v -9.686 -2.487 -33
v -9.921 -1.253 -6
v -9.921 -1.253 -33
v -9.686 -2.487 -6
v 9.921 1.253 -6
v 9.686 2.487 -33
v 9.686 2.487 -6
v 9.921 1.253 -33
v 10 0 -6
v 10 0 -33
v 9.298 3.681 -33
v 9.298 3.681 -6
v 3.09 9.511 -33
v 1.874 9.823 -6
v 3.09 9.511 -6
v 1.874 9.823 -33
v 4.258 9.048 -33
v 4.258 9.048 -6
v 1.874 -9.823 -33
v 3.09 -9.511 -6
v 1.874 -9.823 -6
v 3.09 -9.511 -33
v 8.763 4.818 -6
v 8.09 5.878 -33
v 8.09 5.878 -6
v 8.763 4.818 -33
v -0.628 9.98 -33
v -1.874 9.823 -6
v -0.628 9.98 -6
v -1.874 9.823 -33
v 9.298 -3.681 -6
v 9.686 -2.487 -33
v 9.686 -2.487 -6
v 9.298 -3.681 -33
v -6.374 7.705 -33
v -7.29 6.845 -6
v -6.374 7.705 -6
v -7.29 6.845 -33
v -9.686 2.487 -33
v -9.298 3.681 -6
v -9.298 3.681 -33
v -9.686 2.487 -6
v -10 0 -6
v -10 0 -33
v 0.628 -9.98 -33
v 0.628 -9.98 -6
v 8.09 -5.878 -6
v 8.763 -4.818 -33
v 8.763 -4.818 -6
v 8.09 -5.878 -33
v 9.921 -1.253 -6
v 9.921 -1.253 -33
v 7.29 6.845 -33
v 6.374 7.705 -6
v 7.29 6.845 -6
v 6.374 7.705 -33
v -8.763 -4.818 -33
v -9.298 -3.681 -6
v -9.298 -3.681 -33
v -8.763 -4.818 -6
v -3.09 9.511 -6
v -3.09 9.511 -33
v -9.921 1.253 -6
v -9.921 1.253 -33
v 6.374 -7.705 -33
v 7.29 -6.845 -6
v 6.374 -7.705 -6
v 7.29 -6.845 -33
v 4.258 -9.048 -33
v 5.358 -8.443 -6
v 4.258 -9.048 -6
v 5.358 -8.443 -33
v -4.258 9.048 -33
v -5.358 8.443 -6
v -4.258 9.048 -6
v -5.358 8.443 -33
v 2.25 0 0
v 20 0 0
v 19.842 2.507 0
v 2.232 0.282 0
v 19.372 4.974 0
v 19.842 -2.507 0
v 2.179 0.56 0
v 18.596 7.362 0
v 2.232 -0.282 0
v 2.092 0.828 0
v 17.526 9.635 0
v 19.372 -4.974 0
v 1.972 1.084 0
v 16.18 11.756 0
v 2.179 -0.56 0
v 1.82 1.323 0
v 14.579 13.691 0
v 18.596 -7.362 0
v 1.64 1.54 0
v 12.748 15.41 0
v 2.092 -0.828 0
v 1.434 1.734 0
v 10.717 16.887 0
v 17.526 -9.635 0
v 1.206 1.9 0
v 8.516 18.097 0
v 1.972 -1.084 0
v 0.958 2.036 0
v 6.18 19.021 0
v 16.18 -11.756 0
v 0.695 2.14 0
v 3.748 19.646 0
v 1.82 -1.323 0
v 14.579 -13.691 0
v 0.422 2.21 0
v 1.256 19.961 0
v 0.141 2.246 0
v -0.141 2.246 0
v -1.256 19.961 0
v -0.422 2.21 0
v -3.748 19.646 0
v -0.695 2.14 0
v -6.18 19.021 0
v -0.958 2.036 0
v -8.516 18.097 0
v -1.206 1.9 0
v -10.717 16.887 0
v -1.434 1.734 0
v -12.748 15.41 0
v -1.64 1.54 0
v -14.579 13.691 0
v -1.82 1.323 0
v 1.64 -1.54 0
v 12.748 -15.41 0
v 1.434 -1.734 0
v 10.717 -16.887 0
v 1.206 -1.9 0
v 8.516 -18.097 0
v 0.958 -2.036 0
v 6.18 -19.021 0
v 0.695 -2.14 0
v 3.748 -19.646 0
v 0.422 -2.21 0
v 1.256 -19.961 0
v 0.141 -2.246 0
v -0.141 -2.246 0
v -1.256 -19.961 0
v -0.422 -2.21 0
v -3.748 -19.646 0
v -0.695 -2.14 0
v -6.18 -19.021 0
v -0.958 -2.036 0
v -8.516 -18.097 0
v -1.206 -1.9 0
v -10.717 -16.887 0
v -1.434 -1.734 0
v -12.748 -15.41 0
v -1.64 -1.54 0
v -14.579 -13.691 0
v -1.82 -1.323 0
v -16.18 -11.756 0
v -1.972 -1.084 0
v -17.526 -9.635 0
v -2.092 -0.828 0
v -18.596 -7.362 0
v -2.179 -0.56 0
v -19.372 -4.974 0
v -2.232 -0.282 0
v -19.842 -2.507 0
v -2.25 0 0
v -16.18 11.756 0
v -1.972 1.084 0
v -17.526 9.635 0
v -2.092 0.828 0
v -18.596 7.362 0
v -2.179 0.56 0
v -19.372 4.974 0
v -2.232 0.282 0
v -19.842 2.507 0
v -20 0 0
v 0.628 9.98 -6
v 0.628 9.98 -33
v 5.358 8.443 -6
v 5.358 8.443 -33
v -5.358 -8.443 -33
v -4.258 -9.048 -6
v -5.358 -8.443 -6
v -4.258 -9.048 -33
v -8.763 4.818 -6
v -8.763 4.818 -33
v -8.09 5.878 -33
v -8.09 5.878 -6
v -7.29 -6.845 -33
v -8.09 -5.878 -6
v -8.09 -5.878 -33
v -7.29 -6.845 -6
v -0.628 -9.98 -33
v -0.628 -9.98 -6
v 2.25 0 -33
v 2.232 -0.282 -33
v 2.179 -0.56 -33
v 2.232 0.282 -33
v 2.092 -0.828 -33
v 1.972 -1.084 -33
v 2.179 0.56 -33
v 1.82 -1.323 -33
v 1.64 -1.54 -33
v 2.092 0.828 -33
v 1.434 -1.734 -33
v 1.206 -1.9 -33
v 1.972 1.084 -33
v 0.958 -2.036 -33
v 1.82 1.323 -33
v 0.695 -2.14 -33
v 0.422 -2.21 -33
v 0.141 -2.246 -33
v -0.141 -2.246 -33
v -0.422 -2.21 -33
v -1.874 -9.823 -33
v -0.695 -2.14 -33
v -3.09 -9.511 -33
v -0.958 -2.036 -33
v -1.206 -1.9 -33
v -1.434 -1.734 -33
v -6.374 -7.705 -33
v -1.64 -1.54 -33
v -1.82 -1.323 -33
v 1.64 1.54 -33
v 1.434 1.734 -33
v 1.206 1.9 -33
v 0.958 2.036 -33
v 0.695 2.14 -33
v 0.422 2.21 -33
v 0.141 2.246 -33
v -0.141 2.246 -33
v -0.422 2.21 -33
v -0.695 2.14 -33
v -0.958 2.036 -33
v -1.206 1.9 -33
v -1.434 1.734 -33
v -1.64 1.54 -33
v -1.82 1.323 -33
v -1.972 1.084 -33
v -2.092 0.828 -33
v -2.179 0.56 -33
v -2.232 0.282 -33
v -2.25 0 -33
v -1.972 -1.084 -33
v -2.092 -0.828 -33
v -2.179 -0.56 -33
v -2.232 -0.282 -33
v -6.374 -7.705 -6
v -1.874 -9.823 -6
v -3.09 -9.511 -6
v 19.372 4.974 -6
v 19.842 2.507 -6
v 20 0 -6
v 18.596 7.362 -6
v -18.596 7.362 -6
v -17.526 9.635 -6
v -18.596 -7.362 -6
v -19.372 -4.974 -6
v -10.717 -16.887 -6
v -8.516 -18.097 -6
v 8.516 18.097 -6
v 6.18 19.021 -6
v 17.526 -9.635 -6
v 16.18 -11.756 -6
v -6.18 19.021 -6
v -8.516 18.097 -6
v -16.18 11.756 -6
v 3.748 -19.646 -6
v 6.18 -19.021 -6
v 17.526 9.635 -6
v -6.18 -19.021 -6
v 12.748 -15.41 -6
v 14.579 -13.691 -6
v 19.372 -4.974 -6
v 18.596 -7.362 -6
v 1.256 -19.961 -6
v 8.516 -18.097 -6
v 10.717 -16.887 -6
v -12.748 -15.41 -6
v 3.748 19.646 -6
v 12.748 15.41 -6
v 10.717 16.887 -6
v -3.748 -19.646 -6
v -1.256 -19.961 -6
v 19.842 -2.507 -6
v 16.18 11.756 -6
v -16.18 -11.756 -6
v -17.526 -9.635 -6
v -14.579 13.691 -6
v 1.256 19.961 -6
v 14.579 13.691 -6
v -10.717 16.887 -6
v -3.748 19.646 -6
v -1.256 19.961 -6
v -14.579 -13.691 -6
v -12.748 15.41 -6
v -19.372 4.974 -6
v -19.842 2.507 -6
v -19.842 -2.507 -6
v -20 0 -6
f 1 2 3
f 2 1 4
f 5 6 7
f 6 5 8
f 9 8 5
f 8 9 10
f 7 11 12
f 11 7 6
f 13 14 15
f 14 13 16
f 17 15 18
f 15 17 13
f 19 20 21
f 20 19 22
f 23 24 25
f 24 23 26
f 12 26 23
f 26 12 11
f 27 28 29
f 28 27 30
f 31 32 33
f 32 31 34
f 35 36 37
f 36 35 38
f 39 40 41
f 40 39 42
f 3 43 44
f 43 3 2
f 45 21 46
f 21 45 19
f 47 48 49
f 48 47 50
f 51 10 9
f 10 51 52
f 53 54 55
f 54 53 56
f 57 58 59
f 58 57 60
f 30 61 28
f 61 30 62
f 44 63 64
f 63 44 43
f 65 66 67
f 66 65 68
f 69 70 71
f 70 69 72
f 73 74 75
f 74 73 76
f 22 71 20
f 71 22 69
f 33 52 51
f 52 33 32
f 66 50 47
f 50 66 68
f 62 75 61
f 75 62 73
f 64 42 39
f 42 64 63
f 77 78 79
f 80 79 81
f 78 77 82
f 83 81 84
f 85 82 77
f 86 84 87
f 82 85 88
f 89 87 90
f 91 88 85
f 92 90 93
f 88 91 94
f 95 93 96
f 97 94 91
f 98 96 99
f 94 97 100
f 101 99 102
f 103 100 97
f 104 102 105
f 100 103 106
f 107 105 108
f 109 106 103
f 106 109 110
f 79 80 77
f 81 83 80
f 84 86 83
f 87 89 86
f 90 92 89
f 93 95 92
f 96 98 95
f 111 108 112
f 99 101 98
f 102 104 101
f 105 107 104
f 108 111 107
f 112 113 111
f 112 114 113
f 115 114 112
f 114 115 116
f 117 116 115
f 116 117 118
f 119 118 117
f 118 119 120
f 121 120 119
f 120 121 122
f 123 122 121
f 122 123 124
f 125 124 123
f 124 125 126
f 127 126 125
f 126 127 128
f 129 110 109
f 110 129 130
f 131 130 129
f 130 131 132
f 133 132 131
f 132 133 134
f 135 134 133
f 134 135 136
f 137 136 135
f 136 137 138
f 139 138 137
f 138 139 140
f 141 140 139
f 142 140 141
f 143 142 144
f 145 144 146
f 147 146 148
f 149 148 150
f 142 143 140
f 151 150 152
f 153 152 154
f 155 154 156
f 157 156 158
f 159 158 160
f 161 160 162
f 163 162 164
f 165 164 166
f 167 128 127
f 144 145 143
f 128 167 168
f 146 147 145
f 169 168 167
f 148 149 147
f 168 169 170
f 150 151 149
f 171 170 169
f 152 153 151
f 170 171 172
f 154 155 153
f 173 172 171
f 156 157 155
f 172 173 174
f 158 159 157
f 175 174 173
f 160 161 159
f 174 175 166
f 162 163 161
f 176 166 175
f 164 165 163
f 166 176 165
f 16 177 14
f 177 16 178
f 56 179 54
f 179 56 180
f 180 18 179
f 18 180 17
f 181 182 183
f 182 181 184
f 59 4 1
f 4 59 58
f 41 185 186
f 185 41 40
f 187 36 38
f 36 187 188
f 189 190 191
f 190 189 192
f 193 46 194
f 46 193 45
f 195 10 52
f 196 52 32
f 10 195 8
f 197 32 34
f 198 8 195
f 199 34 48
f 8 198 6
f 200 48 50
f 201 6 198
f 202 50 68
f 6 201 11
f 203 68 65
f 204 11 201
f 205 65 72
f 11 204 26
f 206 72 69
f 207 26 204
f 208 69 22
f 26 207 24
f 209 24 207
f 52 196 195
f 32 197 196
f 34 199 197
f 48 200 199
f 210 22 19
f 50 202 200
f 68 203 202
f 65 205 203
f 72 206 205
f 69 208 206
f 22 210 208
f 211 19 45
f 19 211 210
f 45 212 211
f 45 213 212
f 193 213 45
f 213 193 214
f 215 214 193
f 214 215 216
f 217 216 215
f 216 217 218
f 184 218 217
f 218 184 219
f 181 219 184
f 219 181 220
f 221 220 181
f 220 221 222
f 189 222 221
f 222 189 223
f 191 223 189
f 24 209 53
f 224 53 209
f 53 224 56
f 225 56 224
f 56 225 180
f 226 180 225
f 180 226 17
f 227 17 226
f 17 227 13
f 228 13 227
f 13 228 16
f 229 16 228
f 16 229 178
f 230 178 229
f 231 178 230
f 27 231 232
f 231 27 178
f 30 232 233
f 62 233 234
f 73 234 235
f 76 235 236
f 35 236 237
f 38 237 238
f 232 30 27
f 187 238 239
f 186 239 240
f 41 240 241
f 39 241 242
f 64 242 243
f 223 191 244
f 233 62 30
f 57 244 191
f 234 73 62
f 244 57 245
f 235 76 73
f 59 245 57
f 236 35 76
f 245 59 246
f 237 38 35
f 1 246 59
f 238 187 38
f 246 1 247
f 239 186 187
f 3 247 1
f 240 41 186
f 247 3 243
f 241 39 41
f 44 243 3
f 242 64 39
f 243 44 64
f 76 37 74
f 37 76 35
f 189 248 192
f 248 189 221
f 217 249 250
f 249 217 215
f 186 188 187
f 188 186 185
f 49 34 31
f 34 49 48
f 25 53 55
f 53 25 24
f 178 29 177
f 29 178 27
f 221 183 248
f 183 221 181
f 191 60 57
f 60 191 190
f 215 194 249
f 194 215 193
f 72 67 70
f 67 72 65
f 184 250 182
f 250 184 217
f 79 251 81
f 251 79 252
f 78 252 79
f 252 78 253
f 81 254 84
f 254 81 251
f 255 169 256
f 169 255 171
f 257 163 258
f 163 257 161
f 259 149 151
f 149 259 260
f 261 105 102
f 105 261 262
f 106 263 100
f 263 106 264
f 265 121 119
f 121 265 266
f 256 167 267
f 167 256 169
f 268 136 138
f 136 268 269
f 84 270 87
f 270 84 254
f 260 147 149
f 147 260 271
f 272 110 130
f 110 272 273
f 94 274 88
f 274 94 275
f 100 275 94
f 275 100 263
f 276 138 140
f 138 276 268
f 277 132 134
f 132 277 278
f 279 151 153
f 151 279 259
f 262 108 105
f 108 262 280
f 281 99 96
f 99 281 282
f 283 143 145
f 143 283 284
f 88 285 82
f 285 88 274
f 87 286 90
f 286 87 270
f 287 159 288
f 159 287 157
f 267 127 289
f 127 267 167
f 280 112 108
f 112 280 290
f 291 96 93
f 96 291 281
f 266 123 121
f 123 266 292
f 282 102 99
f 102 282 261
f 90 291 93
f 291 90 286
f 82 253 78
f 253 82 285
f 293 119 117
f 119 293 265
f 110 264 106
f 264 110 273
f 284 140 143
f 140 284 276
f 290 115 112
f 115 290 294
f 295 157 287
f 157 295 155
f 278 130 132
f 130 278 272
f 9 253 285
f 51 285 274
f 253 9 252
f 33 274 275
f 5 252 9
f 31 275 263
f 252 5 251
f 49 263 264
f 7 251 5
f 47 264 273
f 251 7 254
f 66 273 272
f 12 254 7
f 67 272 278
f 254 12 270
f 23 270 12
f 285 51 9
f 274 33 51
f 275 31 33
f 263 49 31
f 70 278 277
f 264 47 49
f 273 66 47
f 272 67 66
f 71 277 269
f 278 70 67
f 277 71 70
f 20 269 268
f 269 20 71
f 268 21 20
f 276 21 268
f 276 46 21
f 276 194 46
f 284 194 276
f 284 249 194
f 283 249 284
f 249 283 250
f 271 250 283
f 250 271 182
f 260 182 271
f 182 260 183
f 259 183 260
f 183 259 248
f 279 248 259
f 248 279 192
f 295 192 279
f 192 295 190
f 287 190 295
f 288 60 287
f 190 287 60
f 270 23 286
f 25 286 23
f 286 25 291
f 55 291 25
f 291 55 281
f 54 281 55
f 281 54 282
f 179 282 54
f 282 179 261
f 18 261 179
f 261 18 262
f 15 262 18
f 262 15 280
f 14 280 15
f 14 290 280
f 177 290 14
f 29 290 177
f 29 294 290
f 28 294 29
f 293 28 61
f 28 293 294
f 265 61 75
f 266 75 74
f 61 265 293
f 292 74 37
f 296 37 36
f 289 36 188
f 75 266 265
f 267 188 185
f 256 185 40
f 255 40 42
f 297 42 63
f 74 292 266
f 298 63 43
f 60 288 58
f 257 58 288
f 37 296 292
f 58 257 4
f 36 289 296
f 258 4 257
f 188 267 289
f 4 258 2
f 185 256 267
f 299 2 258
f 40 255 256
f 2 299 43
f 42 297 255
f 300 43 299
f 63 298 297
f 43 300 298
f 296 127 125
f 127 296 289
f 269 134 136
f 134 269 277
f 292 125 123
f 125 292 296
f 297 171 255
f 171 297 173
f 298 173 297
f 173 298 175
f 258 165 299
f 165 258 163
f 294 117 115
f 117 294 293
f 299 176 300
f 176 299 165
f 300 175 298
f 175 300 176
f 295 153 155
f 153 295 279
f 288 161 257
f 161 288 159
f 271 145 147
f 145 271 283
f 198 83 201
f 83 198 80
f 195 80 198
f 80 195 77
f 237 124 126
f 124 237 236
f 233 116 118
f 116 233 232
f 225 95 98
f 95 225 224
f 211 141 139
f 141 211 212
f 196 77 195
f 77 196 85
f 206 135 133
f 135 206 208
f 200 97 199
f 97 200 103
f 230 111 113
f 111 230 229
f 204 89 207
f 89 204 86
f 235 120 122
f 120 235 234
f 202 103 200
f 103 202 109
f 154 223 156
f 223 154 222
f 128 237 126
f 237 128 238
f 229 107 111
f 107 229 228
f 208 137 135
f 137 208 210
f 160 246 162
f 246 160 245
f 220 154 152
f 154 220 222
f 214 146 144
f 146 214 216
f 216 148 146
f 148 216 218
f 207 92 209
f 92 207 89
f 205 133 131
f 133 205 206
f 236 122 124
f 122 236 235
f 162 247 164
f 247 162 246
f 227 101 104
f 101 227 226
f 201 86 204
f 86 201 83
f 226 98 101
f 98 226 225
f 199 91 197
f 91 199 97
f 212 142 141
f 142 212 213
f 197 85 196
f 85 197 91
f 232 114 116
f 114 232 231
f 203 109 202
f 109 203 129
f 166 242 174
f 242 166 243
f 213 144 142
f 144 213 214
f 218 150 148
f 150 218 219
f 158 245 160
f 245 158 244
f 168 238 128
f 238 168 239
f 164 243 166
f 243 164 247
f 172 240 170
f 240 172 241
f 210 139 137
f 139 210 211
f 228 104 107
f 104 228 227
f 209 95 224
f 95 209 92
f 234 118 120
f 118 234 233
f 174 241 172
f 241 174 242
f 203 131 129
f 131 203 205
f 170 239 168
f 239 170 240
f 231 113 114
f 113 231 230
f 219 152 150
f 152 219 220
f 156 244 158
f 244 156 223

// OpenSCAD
$fn = 50;


difference() {
	union() {
		translate(v = [0, 0, -33.0000000000]) {
			cylinder(h = 33, r = 10.0000000000);
		}
		translate(v = [0, 0, -6.0000000000]) {
			cylinder(h = 6, r = 20.0000000000);
		}
	}
	union() {
		#translate(v = [0, 0, -33]) {
			cylinder(h = 33, r = 2.2500000000);
		}
	}
}
